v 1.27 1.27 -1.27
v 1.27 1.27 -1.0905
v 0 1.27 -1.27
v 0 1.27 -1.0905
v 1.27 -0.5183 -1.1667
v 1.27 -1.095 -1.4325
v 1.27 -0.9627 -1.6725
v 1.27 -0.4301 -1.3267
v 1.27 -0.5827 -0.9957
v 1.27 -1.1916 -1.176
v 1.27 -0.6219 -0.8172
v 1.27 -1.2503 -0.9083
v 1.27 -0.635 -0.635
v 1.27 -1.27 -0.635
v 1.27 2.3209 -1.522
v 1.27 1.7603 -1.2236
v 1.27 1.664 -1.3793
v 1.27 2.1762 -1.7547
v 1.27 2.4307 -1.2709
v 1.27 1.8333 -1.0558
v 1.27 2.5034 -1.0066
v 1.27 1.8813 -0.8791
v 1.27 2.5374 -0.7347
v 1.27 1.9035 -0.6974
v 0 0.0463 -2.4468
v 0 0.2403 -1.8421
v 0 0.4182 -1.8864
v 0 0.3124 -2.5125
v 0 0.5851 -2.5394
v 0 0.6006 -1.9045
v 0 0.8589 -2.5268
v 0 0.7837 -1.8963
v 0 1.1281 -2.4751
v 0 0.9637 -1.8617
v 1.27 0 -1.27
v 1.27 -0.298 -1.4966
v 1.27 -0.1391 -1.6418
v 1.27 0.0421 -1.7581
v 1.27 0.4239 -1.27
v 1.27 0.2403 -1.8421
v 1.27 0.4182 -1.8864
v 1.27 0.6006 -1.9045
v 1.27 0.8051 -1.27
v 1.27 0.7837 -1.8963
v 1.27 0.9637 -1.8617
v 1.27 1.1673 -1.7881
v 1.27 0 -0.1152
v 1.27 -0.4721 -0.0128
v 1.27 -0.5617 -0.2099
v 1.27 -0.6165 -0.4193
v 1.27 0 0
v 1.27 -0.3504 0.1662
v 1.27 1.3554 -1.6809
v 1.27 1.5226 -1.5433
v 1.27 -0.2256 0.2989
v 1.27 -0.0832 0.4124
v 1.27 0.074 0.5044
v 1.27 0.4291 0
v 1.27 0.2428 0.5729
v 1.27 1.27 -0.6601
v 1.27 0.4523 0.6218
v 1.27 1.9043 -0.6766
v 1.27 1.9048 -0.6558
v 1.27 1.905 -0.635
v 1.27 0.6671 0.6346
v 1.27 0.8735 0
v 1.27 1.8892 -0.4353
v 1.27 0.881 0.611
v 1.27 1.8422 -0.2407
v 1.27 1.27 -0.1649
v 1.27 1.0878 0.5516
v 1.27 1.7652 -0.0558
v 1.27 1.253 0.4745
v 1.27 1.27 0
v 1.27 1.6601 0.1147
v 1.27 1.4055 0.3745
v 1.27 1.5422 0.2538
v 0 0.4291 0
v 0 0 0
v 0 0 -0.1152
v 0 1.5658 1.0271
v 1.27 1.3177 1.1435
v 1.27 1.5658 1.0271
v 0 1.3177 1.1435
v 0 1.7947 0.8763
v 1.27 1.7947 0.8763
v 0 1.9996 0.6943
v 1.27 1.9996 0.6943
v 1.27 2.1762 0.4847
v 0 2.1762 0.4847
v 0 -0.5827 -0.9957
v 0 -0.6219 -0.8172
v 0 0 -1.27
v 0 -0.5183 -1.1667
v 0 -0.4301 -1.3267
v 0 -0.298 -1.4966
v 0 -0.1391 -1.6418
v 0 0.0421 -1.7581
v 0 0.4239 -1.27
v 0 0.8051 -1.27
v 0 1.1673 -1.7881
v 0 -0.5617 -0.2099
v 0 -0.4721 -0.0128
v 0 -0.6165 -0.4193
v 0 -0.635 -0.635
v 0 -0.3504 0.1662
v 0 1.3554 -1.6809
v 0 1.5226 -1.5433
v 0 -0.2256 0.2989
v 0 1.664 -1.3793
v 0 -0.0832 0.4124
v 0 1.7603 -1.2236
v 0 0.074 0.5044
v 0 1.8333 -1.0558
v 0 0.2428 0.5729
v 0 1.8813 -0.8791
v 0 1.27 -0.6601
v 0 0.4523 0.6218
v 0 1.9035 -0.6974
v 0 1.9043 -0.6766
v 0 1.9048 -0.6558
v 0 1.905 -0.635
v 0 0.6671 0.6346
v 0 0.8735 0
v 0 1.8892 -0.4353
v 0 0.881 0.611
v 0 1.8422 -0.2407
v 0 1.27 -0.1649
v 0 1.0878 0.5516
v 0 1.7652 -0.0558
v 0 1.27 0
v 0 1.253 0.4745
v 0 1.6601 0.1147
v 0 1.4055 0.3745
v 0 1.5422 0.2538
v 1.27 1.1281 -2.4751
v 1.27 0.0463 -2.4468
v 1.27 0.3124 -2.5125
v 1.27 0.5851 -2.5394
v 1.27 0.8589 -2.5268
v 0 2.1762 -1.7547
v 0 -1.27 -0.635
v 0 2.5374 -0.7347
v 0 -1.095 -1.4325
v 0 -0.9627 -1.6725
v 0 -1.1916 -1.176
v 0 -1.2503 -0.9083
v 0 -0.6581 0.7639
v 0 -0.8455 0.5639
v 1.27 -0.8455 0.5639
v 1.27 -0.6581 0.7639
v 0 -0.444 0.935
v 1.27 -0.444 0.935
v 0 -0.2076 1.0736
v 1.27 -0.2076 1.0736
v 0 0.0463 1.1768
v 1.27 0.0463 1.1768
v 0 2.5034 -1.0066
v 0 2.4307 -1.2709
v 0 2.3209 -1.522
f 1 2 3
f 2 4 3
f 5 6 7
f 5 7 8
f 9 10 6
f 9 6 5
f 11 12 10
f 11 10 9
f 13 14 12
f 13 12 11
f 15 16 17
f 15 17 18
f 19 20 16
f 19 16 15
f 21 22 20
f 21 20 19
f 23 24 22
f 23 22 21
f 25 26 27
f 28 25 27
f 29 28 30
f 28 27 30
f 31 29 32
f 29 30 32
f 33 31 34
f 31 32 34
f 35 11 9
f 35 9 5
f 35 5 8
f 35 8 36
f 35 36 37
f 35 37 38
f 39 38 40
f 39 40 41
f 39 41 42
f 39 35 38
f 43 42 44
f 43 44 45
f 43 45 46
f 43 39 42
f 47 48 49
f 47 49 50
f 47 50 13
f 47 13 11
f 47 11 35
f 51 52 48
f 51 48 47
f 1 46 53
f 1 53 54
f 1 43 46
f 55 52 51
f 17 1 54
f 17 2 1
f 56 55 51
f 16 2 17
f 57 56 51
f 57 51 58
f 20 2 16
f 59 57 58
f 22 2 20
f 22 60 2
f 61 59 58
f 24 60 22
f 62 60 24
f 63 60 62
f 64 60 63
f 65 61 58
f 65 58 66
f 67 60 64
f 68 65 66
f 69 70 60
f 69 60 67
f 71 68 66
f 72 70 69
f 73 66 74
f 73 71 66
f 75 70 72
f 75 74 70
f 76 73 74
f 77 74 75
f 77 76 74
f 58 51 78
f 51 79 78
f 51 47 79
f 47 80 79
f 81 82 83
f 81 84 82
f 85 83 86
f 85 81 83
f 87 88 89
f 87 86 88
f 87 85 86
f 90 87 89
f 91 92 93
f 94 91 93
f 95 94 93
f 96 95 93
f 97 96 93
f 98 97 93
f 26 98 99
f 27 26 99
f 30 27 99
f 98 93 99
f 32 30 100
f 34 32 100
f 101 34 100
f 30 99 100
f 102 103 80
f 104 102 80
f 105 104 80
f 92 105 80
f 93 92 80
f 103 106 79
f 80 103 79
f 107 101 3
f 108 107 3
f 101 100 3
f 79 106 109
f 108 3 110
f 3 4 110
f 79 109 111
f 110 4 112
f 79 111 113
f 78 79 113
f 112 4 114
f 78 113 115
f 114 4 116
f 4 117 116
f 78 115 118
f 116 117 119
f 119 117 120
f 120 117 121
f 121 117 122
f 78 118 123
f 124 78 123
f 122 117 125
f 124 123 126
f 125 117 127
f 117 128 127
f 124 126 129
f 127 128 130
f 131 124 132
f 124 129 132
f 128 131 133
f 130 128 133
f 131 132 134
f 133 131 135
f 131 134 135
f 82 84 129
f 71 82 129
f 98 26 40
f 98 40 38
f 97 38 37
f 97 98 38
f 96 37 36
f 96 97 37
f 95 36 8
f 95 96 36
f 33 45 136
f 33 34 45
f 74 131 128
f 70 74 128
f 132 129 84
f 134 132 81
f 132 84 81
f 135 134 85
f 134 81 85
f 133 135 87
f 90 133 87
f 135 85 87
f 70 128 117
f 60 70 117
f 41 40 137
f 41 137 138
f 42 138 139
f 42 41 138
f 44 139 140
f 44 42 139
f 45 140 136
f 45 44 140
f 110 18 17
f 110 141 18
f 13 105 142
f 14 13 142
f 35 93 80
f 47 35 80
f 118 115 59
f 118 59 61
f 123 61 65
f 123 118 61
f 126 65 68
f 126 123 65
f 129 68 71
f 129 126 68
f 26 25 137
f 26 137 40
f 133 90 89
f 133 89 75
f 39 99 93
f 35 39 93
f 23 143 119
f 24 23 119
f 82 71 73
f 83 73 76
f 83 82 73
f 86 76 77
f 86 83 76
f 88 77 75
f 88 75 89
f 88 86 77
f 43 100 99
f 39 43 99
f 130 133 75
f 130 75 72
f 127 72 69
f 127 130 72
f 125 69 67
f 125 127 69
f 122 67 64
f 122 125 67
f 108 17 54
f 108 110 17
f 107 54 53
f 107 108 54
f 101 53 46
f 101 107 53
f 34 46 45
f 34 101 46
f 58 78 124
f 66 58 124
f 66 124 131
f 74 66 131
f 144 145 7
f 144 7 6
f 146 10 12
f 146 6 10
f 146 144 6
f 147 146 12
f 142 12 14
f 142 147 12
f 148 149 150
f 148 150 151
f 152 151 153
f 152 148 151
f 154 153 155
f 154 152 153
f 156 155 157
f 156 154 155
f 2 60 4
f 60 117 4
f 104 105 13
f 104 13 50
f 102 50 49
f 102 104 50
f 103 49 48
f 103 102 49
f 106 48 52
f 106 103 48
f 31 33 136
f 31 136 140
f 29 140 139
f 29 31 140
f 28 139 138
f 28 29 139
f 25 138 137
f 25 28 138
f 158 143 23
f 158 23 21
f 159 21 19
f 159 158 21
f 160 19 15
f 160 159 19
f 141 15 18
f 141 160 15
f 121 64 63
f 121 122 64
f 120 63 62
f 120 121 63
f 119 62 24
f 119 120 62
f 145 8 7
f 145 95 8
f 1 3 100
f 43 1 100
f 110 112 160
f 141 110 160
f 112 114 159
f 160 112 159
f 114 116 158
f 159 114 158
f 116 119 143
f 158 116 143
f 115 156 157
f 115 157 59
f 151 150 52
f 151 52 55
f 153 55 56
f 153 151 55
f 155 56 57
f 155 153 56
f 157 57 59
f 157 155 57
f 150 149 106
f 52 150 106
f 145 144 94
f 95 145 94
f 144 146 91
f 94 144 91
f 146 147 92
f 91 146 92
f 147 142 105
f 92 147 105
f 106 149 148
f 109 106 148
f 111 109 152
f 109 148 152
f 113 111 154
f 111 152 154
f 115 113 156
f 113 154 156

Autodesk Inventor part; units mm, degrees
ref_plane "YZ Plane" through (0, 0, 0) normal (1, 0, 0) x (0, 1, 0)
ref_plane "XZ Plane" through (0, 0, 0) normal (0, 1, 0) x (-1, 0, 0)
ref_plane "XY Plane" through (0, 0, 0) normal (0, 0, 1) x (1, 0, 0)
sketch "Sketch2" plane through (0, 0, 0) normal (1, 0, 0) x (0, 1, 0)
  line L0 (0, 0) -> (1.27, 0)
  line L1 (1.27, 0) -> (1.27, -1.27)
  line L2 (1.27, -1.27) -> (0, -1.27)
  line L3 (0, -1.27) -> (0, 0)
  circle A0 centre (0.635, -0.635) radius 1.27
  line L4 (-0.4301, -1.3267) -> (-0.9627, -1.6725)
  line L5 (-0.635, -0.635) -> (-1.27, -0.635)
  arc A1 (0.0463, -2.4468) -> (1.1281, -2.4751) centre (0.635, -0.635) ccw
  arc A2 (2.1762, -1.7547) -> (2.5374, -0.7347) centre (0.635, -0.635) ccw
  arc A3 (2.1762, 0.4847) -> (1.3177, 1.1435) centre (0.635, -0.635) ccw
  arc A4 (0.0463, 1.1768) -> (-0.8455, 0.5639) centre (0.635, -0.635) ccw
  arc A5 (-1.27, -0.635) -> (-0.9627, -1.6725) centre (0.635, -0.635) ccw
  line L6 (0.6317, -0.6225) -> (0.8051, -1.27)
  line L7 (0.9637, -1.8617) -> (1.1281, -2.4751)
  line L8 (0.0463, -2.4468) -> (0.2403, -1.8421)
  line L9 (0.4239, -1.27) -> (0.6317, -0.6225)
  line L10 (1.3177, 1.1435) -> (1.0878, 0.5516)
  line L11 (0.8735, 0) -> (0.6317, -0.6225)
  line L12 (2.1762, 0.4847) -> (1.6601, 0.1147)
  line L13 (1.27, -0.1649) -> (0.6317, -0.6225)
  line L14 (2.5374, -0.7347) -> (1.9035, -0.6974)
  line L15 (1.27, -0.6601) -> (0.6317, -0.6225)
  line L16 (2.1762, -1.7547) -> (1.664, -1.3793)
  line L17 (1.27, -1.0905) -> (0.6317, -0.6225)
  line L18 (0.0463, 1.1768) -> (0.2428, 0.5729)
  line L19 (0.4291, 0) -> (0.6317, -0.6225)
  line L20 (-0.8455, 0.5639) -> (-0.3504, 0.1662)
  line L21 (0, -0.1152) -> (0.6317, -0.6225)
  dimension "d15" = 2.54
  dimension "d13" = 1.27
  dimension "d14" = 1.27
extrude "Extrusion2" add sketch "Sketch2" along normal blind 1.27
properties part number "SmallGear"
